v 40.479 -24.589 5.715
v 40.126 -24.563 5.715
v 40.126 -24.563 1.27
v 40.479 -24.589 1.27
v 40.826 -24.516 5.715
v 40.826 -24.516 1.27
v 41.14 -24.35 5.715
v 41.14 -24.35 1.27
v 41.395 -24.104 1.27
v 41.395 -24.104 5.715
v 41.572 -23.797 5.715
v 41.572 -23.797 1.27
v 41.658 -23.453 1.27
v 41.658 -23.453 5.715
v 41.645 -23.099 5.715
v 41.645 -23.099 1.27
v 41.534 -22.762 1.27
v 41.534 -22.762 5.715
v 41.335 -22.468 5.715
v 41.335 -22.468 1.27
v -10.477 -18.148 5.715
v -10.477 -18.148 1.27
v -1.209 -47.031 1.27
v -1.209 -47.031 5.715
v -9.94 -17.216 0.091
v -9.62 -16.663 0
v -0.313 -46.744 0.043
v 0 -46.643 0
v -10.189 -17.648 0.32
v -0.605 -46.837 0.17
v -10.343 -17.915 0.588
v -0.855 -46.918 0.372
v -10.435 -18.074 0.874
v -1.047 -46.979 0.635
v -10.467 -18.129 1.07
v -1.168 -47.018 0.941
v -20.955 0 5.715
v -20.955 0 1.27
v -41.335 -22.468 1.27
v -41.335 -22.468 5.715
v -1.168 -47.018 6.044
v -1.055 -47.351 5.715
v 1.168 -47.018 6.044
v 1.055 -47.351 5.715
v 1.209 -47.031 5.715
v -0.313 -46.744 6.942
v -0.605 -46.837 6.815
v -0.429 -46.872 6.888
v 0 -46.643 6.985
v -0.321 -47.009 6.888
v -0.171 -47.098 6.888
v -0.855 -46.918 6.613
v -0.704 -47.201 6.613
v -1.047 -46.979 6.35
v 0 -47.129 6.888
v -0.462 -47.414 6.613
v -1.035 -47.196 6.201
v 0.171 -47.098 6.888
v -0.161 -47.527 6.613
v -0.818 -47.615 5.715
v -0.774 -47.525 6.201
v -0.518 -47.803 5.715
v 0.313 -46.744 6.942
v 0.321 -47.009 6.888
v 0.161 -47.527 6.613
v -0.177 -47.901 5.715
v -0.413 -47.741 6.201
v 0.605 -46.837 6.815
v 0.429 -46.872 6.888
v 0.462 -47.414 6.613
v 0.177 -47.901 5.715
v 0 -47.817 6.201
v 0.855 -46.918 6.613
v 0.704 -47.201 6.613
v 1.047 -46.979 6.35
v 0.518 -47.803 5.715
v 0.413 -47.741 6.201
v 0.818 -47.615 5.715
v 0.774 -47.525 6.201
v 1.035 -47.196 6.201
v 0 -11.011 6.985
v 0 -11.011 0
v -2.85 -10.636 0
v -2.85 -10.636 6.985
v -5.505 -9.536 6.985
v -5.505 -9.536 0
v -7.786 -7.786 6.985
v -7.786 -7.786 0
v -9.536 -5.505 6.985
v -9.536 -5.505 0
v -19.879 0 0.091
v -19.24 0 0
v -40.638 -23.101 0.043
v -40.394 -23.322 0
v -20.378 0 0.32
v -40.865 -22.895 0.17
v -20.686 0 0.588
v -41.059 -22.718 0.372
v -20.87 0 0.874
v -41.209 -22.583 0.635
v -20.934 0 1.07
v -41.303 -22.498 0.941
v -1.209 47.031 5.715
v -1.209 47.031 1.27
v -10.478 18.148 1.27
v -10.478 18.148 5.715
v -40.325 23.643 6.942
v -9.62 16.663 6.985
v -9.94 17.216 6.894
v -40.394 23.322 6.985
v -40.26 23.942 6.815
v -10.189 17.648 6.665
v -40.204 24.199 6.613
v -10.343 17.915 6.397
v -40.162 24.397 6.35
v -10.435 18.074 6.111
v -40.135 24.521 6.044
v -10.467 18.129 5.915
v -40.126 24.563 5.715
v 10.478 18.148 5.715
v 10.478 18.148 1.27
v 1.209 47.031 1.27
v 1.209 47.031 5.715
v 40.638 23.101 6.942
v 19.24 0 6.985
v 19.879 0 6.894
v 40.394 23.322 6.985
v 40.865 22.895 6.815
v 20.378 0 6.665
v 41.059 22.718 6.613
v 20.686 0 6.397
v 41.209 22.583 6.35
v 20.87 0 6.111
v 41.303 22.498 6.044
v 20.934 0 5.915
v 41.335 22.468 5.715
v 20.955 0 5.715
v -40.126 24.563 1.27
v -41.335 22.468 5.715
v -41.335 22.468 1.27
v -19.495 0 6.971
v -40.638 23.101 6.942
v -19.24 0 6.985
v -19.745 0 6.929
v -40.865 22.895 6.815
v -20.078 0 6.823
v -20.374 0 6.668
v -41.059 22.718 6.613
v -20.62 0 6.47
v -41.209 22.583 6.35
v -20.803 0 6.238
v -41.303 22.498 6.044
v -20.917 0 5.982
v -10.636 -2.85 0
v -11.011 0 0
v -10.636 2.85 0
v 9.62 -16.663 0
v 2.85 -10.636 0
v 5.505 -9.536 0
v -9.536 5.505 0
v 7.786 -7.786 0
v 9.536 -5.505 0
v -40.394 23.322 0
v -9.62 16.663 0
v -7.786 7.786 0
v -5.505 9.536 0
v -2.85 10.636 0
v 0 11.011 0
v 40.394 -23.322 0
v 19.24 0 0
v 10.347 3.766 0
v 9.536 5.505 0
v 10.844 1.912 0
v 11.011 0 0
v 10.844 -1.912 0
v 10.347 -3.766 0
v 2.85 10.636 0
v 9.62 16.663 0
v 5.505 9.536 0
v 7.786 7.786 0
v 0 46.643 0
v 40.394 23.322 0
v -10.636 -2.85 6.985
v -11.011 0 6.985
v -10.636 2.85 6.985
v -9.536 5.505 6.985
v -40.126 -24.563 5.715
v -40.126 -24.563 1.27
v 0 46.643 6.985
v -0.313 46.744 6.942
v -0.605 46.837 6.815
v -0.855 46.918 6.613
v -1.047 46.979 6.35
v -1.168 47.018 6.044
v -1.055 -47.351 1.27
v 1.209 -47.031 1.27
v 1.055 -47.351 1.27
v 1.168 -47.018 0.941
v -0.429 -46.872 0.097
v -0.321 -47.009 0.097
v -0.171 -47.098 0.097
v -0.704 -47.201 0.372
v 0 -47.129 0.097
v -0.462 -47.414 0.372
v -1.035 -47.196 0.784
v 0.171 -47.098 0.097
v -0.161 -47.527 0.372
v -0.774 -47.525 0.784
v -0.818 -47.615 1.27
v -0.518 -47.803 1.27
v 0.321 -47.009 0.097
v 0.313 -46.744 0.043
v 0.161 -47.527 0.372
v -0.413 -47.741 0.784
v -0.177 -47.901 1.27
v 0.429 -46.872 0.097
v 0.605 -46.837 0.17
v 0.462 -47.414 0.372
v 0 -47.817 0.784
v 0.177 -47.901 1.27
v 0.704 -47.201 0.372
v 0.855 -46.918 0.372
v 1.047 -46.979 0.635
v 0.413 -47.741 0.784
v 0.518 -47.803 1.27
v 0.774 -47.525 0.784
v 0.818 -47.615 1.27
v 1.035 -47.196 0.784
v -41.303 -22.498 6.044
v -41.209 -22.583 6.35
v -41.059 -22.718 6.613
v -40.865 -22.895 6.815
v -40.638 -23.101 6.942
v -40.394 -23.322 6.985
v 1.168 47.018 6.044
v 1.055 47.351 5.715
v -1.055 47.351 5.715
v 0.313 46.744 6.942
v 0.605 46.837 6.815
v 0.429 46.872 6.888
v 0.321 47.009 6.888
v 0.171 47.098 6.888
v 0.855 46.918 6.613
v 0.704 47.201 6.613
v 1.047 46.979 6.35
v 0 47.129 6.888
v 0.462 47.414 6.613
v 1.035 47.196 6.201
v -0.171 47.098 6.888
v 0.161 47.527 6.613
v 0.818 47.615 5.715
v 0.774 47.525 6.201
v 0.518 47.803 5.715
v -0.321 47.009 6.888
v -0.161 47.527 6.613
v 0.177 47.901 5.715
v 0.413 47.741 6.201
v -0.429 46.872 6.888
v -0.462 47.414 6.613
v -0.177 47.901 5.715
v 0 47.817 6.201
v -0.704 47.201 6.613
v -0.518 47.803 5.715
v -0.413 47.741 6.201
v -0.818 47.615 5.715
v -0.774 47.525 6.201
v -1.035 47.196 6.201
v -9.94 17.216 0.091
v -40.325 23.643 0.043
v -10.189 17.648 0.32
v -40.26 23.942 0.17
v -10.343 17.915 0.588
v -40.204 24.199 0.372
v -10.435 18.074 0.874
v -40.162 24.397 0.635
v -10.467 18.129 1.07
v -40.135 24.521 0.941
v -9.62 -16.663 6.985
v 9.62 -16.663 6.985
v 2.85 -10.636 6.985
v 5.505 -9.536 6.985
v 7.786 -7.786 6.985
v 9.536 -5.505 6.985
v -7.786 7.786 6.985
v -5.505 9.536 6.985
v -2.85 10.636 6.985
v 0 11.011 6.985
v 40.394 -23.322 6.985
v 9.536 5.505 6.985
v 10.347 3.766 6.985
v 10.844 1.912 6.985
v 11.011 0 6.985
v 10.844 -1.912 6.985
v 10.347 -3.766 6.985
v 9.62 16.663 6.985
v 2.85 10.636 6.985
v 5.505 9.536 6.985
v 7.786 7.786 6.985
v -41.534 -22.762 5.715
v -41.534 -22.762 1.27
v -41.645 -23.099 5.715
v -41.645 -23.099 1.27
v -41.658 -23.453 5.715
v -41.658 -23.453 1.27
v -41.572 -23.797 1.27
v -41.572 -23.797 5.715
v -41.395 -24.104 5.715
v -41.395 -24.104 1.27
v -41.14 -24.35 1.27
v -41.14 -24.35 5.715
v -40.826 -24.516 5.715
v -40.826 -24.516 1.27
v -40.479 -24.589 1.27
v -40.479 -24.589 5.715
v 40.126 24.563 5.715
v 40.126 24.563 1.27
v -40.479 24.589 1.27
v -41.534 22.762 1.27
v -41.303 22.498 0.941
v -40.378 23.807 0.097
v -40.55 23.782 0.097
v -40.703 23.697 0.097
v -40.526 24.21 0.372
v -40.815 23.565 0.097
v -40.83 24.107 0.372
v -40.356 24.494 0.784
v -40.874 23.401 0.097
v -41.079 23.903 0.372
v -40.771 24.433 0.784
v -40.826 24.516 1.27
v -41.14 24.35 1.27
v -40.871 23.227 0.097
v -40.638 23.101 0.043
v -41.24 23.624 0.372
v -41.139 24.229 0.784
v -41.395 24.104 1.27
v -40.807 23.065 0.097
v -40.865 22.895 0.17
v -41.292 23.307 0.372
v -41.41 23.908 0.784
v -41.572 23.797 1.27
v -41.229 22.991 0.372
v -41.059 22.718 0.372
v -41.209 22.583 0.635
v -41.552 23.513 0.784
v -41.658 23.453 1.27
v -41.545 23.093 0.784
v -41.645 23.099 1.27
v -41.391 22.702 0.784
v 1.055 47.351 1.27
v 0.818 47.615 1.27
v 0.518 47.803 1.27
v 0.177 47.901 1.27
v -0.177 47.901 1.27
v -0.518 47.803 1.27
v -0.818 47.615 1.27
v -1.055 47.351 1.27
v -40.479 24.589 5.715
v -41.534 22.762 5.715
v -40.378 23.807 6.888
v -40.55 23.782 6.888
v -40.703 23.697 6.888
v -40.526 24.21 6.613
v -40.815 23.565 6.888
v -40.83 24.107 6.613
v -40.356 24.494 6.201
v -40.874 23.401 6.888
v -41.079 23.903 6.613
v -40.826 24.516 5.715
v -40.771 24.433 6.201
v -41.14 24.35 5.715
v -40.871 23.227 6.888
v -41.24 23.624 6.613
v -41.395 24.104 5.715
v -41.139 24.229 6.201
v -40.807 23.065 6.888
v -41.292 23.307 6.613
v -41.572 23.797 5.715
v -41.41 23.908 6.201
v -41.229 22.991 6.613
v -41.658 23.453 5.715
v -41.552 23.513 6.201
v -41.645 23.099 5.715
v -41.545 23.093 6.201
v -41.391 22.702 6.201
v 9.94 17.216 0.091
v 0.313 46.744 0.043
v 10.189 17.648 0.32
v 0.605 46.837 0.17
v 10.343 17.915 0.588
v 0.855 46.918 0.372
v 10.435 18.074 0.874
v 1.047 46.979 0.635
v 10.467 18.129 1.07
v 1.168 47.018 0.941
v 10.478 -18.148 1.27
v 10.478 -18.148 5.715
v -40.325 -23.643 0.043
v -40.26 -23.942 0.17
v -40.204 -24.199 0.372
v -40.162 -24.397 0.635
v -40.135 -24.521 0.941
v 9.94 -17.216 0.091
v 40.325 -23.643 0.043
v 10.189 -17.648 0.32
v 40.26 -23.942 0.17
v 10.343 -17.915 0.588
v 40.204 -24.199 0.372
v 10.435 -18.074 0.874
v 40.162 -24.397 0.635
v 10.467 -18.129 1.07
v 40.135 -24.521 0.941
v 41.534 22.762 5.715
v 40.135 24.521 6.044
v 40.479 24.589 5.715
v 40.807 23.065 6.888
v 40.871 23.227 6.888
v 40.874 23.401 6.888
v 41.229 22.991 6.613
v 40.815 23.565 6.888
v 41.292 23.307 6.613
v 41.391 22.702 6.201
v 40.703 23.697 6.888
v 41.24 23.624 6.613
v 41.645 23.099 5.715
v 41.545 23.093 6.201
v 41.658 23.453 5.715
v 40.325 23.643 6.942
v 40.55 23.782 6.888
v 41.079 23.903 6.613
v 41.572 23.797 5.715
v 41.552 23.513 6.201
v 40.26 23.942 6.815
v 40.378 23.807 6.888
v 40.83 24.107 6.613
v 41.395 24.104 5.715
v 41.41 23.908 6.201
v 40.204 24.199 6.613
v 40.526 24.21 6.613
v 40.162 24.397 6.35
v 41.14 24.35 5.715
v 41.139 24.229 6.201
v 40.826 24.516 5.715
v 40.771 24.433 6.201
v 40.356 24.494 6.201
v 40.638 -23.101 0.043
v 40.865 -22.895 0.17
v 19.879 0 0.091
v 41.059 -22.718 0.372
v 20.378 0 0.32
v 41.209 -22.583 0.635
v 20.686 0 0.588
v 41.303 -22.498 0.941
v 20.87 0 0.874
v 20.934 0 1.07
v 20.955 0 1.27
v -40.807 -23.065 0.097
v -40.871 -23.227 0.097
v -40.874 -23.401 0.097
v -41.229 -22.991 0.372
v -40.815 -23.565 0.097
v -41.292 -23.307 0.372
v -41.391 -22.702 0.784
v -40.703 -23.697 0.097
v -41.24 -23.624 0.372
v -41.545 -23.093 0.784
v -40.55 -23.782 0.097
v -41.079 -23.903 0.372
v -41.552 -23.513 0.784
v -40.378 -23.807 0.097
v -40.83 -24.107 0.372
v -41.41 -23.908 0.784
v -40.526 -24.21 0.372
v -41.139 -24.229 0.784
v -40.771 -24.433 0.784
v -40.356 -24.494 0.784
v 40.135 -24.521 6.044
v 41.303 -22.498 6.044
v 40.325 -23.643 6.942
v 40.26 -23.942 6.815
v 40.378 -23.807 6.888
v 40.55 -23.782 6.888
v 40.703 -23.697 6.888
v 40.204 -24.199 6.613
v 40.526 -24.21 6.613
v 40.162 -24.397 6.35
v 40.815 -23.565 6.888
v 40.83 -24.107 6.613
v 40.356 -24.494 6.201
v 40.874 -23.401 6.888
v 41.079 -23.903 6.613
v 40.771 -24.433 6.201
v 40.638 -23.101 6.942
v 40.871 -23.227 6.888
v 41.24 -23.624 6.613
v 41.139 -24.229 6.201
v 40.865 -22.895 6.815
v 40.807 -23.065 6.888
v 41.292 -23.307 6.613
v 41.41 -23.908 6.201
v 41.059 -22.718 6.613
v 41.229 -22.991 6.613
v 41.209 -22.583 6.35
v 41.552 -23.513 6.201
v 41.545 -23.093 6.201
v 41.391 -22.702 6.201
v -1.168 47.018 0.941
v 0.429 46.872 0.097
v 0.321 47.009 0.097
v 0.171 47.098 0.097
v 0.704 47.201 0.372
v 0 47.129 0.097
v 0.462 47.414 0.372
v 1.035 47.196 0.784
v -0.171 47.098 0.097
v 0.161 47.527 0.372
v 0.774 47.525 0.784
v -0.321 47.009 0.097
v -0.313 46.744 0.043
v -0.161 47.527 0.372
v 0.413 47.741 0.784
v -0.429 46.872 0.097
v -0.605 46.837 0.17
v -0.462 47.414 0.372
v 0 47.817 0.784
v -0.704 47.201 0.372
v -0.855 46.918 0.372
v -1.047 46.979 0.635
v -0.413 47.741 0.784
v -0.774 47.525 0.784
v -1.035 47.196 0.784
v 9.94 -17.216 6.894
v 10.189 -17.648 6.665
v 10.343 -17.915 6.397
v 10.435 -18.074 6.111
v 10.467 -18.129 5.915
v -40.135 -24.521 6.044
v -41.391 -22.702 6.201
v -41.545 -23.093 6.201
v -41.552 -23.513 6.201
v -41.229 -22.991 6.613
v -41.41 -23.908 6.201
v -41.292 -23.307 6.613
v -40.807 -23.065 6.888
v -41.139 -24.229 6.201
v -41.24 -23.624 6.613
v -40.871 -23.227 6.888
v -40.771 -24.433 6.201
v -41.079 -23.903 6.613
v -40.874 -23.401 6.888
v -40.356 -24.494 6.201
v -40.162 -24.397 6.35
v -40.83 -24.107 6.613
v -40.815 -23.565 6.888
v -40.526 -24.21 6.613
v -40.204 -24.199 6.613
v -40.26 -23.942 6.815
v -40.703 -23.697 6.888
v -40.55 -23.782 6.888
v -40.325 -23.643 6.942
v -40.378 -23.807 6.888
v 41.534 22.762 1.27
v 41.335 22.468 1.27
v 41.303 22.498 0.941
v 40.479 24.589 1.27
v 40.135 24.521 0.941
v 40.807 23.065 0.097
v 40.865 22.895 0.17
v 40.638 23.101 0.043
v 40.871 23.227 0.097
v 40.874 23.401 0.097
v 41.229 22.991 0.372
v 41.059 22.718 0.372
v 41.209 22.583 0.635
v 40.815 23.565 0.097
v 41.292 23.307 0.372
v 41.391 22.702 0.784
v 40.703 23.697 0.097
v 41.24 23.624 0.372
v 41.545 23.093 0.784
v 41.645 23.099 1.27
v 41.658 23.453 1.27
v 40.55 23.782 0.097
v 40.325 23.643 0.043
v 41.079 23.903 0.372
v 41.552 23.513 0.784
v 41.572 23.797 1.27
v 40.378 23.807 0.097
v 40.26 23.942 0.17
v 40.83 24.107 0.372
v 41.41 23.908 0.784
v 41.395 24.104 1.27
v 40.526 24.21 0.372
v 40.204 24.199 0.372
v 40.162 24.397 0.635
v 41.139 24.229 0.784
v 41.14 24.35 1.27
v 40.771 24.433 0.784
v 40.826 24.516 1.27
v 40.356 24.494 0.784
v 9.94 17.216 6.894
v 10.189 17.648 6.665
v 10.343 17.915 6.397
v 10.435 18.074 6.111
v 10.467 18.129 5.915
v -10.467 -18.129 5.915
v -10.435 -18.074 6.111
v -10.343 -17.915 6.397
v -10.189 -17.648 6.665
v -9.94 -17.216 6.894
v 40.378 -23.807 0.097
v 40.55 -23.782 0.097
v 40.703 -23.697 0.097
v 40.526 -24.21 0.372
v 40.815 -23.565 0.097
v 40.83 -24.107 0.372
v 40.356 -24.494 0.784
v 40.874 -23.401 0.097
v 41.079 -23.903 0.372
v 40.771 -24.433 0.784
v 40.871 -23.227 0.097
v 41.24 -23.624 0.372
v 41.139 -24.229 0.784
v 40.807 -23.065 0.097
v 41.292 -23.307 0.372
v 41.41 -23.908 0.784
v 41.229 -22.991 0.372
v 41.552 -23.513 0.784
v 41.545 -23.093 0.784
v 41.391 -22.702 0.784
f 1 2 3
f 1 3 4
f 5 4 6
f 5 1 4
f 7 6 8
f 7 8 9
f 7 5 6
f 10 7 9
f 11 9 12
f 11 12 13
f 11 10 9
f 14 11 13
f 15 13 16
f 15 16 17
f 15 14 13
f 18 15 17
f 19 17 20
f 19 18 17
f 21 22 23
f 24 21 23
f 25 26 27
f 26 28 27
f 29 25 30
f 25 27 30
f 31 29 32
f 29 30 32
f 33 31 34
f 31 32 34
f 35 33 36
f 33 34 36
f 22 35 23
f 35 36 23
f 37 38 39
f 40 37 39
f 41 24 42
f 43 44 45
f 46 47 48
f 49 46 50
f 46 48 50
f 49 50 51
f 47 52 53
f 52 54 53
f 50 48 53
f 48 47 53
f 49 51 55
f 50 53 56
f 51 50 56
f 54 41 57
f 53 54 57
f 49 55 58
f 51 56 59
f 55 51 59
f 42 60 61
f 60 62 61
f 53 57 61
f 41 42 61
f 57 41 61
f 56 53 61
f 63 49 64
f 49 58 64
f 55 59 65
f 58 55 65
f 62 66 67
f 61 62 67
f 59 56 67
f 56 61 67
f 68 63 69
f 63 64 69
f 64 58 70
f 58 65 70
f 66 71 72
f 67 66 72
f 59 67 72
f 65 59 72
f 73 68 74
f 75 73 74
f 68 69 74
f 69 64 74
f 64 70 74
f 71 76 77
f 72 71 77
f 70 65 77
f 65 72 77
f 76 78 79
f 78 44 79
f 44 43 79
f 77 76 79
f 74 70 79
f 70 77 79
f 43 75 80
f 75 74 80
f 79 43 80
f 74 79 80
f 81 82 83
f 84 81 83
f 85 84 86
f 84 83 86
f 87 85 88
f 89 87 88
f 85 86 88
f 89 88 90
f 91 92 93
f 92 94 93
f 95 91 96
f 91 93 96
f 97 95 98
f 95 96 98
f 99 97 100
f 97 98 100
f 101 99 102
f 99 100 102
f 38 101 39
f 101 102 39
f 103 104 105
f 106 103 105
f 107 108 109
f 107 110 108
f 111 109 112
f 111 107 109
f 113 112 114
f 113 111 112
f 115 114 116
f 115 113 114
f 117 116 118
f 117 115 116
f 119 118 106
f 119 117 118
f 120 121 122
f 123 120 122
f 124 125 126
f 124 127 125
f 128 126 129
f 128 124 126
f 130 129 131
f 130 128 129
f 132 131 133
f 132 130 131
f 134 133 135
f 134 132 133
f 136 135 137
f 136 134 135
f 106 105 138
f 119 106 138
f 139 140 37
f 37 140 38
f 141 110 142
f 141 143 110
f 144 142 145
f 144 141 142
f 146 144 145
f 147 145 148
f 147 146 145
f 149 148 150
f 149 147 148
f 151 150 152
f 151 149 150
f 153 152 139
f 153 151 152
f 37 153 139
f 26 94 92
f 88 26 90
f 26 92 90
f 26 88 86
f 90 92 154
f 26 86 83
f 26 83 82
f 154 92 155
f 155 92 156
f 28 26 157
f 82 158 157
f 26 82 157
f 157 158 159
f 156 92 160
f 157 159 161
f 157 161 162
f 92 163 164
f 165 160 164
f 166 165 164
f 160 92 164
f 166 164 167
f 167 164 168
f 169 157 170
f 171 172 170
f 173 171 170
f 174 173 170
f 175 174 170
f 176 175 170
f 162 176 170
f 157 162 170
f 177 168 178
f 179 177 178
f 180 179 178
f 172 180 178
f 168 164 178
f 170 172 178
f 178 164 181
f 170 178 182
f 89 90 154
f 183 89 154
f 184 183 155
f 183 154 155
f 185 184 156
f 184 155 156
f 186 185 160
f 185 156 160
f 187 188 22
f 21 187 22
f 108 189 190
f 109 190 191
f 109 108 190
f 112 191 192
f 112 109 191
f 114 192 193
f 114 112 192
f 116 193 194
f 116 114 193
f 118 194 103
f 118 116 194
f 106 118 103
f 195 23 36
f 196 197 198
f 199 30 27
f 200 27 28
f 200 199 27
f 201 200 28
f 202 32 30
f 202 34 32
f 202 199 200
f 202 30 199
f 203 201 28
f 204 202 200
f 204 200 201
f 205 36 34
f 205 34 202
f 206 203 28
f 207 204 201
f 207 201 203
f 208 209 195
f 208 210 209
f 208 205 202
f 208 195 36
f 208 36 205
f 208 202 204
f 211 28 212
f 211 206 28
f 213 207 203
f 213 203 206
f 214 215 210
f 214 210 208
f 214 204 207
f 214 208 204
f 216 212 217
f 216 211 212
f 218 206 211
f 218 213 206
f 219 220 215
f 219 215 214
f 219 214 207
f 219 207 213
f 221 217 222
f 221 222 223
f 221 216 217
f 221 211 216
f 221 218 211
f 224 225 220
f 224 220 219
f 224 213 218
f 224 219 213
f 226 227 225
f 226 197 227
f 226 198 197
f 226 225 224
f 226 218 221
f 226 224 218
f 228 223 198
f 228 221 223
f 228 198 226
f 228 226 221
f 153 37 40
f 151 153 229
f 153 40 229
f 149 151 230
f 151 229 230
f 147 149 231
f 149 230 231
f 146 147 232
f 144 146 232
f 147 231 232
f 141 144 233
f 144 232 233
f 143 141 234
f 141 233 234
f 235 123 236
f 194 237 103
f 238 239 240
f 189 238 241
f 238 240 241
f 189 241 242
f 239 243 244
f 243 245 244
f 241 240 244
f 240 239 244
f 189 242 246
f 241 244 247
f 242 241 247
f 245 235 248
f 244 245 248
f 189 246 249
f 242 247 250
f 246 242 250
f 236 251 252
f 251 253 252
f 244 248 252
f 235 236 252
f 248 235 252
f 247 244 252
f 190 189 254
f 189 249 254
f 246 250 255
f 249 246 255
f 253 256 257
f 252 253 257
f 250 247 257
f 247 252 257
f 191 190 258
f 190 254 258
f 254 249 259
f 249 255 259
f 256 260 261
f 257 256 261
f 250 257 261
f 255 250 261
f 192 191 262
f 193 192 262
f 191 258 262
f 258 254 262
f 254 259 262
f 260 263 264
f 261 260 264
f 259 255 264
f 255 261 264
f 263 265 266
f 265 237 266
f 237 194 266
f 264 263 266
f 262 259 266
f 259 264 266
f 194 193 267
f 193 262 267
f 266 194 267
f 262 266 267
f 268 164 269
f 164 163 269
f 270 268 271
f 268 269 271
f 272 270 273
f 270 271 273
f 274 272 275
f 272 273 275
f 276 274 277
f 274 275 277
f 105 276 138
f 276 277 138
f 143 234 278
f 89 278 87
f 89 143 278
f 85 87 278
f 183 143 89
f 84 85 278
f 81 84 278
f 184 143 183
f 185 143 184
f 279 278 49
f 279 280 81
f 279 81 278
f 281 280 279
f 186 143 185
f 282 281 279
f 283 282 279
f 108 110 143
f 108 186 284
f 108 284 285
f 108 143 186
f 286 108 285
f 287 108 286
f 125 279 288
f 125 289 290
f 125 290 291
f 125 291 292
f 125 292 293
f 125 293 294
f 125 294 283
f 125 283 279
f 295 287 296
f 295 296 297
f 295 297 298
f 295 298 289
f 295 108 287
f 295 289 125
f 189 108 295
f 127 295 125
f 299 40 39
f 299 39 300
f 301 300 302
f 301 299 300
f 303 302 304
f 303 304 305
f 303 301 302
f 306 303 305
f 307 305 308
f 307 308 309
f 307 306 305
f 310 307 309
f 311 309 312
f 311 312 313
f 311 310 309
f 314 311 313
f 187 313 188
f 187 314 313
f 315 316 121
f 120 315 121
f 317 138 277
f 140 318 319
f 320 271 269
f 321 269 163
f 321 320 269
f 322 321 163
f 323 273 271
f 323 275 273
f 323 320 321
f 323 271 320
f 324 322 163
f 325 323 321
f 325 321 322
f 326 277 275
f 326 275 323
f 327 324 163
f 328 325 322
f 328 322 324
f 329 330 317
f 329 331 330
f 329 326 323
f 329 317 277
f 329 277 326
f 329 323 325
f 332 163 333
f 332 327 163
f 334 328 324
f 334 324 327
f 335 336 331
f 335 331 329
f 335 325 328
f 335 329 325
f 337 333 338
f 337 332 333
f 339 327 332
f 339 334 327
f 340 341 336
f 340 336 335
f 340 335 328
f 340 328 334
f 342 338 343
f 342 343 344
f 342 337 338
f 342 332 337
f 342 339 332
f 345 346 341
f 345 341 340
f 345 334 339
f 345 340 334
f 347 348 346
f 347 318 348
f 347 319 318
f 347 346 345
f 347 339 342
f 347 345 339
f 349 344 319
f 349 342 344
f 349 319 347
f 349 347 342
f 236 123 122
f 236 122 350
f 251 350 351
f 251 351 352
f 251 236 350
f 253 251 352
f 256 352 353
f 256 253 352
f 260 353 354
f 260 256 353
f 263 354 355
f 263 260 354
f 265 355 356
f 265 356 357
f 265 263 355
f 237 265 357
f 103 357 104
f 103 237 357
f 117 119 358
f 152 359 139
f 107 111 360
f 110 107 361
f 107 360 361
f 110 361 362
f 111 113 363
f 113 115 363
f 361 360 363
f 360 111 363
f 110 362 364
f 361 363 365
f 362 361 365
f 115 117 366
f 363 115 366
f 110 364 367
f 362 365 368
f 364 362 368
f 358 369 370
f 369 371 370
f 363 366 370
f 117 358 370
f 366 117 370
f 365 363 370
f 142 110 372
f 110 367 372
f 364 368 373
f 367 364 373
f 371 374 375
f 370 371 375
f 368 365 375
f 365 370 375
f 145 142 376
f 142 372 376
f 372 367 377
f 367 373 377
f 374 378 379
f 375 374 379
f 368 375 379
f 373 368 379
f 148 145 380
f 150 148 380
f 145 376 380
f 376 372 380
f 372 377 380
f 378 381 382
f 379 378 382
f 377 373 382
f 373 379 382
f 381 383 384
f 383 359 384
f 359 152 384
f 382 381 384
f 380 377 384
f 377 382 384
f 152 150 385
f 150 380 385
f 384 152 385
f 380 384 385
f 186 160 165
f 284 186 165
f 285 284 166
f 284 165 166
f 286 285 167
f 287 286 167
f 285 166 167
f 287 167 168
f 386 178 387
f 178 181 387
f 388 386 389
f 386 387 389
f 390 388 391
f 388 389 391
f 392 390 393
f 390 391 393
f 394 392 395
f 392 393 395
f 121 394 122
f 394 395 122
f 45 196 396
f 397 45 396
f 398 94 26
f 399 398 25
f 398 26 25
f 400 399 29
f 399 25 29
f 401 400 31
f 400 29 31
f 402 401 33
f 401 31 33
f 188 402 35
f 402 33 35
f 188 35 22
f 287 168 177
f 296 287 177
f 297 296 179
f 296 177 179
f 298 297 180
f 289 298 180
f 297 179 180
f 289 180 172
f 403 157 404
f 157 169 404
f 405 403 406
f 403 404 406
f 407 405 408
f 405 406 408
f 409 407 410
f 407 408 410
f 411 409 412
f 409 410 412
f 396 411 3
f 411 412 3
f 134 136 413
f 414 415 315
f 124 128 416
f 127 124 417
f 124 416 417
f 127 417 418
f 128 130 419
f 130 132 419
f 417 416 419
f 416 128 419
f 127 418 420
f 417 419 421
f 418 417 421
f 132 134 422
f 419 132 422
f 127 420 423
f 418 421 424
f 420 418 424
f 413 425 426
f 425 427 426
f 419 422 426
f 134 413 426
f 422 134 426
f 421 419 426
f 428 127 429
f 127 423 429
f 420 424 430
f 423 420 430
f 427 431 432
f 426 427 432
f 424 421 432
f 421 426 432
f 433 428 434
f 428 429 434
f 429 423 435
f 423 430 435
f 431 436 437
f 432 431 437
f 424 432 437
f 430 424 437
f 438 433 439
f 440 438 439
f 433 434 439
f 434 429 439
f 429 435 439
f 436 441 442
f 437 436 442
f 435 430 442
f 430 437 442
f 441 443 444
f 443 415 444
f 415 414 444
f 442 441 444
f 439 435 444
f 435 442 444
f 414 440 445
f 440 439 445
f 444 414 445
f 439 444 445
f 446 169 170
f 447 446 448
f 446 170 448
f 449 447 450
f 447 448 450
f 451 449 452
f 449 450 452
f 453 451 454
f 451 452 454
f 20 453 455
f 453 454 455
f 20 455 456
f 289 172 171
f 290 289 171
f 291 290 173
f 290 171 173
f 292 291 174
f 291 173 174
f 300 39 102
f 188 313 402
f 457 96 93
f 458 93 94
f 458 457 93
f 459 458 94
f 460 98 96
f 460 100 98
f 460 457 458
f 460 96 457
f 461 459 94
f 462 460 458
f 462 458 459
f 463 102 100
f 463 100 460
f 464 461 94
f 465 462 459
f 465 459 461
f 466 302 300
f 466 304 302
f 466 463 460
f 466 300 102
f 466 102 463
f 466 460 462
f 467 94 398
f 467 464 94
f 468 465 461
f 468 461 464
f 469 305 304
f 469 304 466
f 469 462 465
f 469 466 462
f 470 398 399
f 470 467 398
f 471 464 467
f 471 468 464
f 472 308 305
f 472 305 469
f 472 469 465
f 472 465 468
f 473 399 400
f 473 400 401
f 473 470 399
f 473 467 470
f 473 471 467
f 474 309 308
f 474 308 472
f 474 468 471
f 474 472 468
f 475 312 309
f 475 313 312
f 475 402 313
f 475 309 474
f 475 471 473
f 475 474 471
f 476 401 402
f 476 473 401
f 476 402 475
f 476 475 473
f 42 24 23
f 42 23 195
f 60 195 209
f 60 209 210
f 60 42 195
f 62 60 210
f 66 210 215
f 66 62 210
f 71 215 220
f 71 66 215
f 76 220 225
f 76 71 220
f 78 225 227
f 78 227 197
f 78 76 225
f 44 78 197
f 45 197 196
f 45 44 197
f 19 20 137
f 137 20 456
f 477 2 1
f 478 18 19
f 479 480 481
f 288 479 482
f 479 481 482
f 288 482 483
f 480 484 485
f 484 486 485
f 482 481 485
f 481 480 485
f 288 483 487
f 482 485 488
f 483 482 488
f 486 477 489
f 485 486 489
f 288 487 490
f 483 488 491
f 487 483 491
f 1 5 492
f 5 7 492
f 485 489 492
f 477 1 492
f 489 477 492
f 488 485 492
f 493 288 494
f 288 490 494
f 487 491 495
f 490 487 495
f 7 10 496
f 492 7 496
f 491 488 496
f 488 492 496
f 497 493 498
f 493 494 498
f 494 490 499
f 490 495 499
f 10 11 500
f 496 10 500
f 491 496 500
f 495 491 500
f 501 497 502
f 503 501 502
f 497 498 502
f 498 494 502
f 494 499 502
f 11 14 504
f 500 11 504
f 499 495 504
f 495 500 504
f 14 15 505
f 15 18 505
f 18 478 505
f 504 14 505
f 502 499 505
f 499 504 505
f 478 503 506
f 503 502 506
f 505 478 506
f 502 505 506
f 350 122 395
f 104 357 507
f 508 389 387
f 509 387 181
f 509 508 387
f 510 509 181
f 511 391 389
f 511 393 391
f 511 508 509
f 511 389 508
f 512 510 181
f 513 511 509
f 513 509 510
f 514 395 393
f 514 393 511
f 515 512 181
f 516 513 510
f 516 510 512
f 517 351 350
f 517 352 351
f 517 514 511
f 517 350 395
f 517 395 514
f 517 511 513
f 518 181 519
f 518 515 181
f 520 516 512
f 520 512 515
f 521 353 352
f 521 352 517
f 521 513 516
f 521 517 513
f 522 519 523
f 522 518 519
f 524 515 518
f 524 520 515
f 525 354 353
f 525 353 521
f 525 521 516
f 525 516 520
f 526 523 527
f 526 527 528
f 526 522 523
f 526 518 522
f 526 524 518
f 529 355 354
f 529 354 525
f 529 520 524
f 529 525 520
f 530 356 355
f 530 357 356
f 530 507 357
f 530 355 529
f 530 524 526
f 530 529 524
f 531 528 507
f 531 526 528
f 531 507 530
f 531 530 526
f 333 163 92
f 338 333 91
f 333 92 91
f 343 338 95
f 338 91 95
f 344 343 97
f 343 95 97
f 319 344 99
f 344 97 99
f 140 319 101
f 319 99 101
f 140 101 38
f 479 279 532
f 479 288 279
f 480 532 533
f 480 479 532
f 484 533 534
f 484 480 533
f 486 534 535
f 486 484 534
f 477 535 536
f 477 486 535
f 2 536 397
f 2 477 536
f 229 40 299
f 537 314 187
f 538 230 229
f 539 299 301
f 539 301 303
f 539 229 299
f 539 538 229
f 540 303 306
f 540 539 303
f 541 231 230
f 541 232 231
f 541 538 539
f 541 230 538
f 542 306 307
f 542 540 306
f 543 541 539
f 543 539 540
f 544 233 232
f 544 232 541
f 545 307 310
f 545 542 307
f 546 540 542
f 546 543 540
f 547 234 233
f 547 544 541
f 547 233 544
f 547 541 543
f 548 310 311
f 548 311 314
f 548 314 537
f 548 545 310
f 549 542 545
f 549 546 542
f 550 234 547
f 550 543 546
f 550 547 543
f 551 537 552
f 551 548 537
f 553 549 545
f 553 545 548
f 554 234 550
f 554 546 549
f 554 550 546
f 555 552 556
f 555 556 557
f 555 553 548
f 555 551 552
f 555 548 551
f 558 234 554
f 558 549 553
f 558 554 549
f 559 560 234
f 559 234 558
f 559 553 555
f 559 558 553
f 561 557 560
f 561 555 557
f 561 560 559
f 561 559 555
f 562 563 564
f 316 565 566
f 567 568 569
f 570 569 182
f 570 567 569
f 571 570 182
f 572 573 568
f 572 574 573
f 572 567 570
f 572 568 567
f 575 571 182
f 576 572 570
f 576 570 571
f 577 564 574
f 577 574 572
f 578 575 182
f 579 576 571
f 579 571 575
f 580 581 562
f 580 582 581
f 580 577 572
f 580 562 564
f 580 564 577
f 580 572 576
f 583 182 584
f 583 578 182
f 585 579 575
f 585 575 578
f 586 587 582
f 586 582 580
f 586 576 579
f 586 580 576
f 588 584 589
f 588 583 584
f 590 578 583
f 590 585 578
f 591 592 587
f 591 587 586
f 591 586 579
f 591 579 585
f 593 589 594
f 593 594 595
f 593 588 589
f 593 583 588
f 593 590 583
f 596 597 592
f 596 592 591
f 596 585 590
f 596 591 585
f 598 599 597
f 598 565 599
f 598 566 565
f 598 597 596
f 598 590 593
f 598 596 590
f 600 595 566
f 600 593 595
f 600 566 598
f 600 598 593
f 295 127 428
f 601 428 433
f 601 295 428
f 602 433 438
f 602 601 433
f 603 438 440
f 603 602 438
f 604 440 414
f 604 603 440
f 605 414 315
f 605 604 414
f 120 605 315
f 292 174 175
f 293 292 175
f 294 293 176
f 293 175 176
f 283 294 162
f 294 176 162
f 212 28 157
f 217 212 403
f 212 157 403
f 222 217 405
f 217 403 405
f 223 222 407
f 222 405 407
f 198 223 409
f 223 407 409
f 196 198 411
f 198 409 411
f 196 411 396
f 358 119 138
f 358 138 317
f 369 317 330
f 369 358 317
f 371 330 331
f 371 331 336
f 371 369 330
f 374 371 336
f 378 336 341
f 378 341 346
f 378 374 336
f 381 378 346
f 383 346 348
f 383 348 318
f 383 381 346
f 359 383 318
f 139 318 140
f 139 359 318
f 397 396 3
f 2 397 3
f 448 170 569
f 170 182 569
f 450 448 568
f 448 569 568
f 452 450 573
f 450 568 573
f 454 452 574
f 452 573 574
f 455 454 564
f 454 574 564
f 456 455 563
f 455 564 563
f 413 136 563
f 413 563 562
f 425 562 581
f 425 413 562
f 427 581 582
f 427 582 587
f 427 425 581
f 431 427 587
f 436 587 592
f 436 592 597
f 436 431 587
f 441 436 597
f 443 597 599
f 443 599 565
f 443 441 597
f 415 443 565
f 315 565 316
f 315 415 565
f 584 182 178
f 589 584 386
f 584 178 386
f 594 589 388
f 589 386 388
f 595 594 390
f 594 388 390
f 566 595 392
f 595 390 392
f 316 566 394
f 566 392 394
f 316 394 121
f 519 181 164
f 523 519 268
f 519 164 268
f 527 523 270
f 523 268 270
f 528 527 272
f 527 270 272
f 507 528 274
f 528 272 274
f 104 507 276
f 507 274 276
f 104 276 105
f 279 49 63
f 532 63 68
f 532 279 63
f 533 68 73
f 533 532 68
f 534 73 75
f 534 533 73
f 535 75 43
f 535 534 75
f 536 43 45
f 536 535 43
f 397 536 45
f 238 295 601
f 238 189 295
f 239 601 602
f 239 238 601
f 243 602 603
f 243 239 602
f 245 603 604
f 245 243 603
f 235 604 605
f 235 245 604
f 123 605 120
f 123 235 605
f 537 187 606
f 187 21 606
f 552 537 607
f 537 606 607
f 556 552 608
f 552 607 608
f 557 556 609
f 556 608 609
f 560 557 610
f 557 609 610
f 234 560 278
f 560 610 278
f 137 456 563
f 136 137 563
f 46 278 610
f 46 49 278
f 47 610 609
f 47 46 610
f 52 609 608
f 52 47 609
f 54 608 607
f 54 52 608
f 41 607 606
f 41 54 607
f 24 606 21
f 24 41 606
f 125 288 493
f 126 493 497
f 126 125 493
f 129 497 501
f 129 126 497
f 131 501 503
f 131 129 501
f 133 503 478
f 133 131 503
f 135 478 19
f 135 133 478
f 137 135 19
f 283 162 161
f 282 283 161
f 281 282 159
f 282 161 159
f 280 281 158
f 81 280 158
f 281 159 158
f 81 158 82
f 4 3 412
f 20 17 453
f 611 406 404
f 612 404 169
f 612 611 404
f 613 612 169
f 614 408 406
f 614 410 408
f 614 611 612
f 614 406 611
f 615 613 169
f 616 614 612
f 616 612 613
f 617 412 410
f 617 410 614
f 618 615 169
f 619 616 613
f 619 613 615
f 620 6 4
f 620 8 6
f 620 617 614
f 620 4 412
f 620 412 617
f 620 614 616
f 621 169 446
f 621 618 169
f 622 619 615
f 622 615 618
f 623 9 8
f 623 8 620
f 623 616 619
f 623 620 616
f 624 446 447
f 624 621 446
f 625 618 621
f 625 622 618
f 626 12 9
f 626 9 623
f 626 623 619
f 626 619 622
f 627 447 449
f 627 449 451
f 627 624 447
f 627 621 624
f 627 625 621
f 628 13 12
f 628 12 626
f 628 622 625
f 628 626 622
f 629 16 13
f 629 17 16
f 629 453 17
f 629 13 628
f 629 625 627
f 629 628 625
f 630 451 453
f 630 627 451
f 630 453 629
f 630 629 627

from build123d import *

# Parameters (mm, degrees)
F1_DEPTH = 6.985
F2_R     = 1.27
F3_R     = 1.27


with BuildPart() as f1:
    # F0 (on Top) → F1 (new body)
    with BuildSketch(Plane.XY):
        with BuildLine():
            Line((15.71625, 9.0737811682), (13.7528333371, 7.9402020293))
            ThreePointArc((13.7528333371, 7.9402020293), (15.3392924121, 4.1101510143), (15.8804040586, 0))
            ThreePointArc((15.8804040586, 0), (15.3392924121, -4.1101510143), (13.7528333371, -7.9402020293))
            Line((13.7528333371, -7.9402020293), (15.71625, -9.0737811682))
            Line((15.71625, -9.0737811682), (20.955, 0))
            Line((20.955, 0), (15.71625, 9.0737811682))
        make_face()
        with BuildLine():
            ThreePointArc((0, 15.8804040586), (7.9402020293, 13.7528333371), (13.7528333371, 7.9402020293))
            Line((13.7528333371, 7.9402020293), (15.71625, 9.0737811682))
            Line((15.71625, 9.0737811682), (10.4775, 18.1475623363))
            Line((10.4775, 18.1475623363), (0, 18.1475623363))
            Line((0, 18.1475623363), (0, 15.8804040586))
        make_face()
        with BuildLine():
            Line((15.71625, -9.0737811682), (13.7528333371, -7.9402020293))
            ThreePointArc((13.7528333371, -7.9402020293), (7.9402020293, -13.7528333371), (0, -15.8804040586))
            Line((0, -15.8804040586), (0, -18.1475623363))
            Line((0, -18.1475623363), (10.4775, -18.1475623363))
            Line((10.4775, -18.1475623363), (15.71625, -9.0737811682))
        make_face()
        with BuildLine():
            ThreePointArc((-13.7528333371, 7.9402020293), (-7.9402020293, 13.7528333371), (0, 15.8804040586))
            Line((0, 15.8804040586), (0, 18.1475623363))
            Line((0, 18.1475623363), (-10.4775, 18.1475623363))
            Line((-10.4775, 18.1475623363), (-15.71625, 9.0737811682))
            Line((-15.71625, 9.0737811682), (-13.7528333371, 7.9402020293))
        make_face()
        Polygon((10.4775, 18.1475623363), (15.71625, 9.0737811682), (43.9940905122, 25.4), align=None)
        Polygon((43.9940905122, 25.4), (15.71625, 9.0737811682), (20.955, 0), align=None)
        with BuildLine():
            Line((0, -18.1475623363), (0, -15.8804040586))
            ThreePointArc((0, -15.8804040586), (-7.9402020293, -13.7528333371), (-13.7528333371, -7.9402020293))
            Line((-13.7528333371, -7.9402020293), (-15.71625, -9.0737811682))
            Line((-15.71625, -9.0737811682), (-10.4775, -18.1475623363))
            Line((-10.4775, -18.1475623363), (0, -18.1475623363))
        make_face()
        Polygon((20.955, 0), (15.71625, -9.0737811682), (43.9940905122, -25.4), align=None)
        Polygon((43.9940905122, -25.4), (15.71625, -9.0737811682), (10.4775, -18.1475623363), align=None)
        with BuildLine():
            ThreePointArc((-13.7528333371, -7.9402020293), (-15.8804040586, 0), (-13.7528333371, 7.9402020293))
            Line((-13.7528333371, 7.9402020293), (-15.71625, 9.0737811682))
            Line((-15.71625, 9.0737811682), (-20.955, 0))
            Line((-20.955, 0), (-15.71625, -9.0737811682))
            Line((-15.71625, -9.0737811682), (-13.7528333371, -7.9402020293))
        make_face()
        Polygon((-10.4775, 18.1475623363), (0, 18.1475623363), (0, 50.8), align=None)
        Polygon((0, 50.8), (0, 18.1475623363), (10.4775, 18.1475623363), align=None)
        Polygon((10.4775, -18.1475623363), (0, -18.1475623363), (0, -50.8), align=None)
        Polygon((0, -50.8), (0, -18.1475623363), (-10.4775, -18.1475623363), align=None)
        Polygon((-20.955, 0), (-15.71625, 9.0737811682), (-43.9940905122, 25.4), align=None)
        Polygon((-43.9940905122, 25.4), (-15.71625, 9.0737811682), (-10.4775, 18.1475623363), align=None)
        Polygon((-10.4775, -18.1475623363), (-15.71625, -9.0737811682), (-43.9940905122, -25.4), align=None)
        Polygon((-43.9940905122, -25.4), (-15.71625, -9.0737811682), (-20.955, 0), align=None)
        with BuildLine():
            ThreePointArc((-9.5357191185, 5.50545), (-5.50545, 9.5357191185), (0, 11.0109))
            Line((0, 11.0109), (0, 15.8804040586))
            ThreePointArc((0, 15.8804040586), (-7.9402020293, 13.7528333371), (-13.7528333371, 7.9402020293))
            Line((-13.7528333371, 7.9402020293), (-9.5357191185, 5.50545))
        make_face()
        with BuildLine():
            ThreePointArc((0, 11.0109), (5.50545, 9.5357191185), (9.5357191185, 5.50545))
            Line((9.5357191185, 5.50545), (13.7528333371, 7.9402020293))
            ThreePointArc((13.7528333371, 7.9402020293), (7.9402020293, 13.7528333371), (0, 15.8804040586))
            Line((0, 15.8804040586), (0, 11.0109))
        make_face()
        with BuildLine():
            ThreePointArc((9.5357191185, 5.50545), (10.6357126807, 2.8498306237), (11.0109, 0))
            ThreePointArc((11.0109, 0), (10.6357126807, -2.8498306237), (9.5357191185, -5.50545))
            Line((9.5357191185, -5.50545), (13.7528333371, -7.9402020293))
            ThreePointArc((13.7528333371, -7.9402020293), (15.3392924121, -4.1101510143), (15.8804040586, 0))
            ThreePointArc((15.8804040586, 0), (15.3392924121, 4.1101510143), (13.7528333371, 7.9402020293))
            Line((13.7528333371, 7.9402020293), (9.5357191185, 5.50545))
        make_face()
        with BuildLine():
            Line((13.7528333371, -7.9402020293), (9.5357191185, -5.50545))
            ThreePointArc((9.5357191185, -5.50545), (5.50545, -9.5357191185), (0, -11.0109))
            Line((0, -11.0109), (0, -15.8804040586))
            ThreePointArc((0, -15.8804040586), (7.9402020293, -13.7528333371), (13.7528333371, -7.9402020293))
        make_face()
        with BuildLine():
            Line((0, -15.8804040586), (0, -11.0109))
            ThreePointArc((0, -11.0109), (-5.50545, -9.5357191185), (-9.5357191185, -5.50545))
            Line((-9.5357191185, -5.50545), (-13.7528333371, -7.9402020293))
            ThreePointArc((-13.7528333371, -7.9402020293), (-7.9402020293, -13.7528333371), (0, -15.8804040586))
        make_face()
        with BuildLine():
            ThreePointArc((-9.5357191185, -5.50545), (-11.0109, 0), (-9.5357191185, 5.50545))
            Line((-9.5357191185, 5.50545), (-13.7528333371, 7.9402020293))
            ThreePointArc((-13.7528333371, 7.9402020293), (-15.8804040586, 0), (-13.7528333371, -7.9402020293))
            Line((-13.7528333371, -7.9402020293), (-9.5357191185, -5.50545))
        make_face()
    extrude(amount=F1_DEPTH)

    # F2
    f2_edges = [f1.edges().sort_by_distance(p)[0] for p in [
        (0, 50.8, 3.4925),
        (-43.994091, -25.4, 3.4925),
        (-43.994091, 25.4, 3.4925),
        (0, -50.8, 3.4925),
        (43.994091, -25.4, 3.4925),
        (43.994091, 25.4, 3.4925),
    ]]
    fillet(f2_edges, radius=F2_R)

    # F3
    f3_edges = [f1.edges().sort_by_distance(p)[0] for p in [
        (31.145007, -11.234219, 6.985),
        (5.843385, -32.589477, 6.985),
        (-25.301622, -21.355258, 6.985),
        (-31.145007, 11.234219, 6.985),
        (25.301622, 21.355258, 6.985),
        (-5.843385, 32.589477, 6.985),
        (25.301622, 21.355258, 0),
        (25.301622, -21.355258, 0),
        (5.843385, -32.589477, 0),
        (-25.301622, -21.355258, 0),
        (-31.145007, 11.234219, 0),
        (5.843385, 32.589477, 0),
    ]]
    fillet(f3_edges, radius=F3_R)


solid = f1.part
